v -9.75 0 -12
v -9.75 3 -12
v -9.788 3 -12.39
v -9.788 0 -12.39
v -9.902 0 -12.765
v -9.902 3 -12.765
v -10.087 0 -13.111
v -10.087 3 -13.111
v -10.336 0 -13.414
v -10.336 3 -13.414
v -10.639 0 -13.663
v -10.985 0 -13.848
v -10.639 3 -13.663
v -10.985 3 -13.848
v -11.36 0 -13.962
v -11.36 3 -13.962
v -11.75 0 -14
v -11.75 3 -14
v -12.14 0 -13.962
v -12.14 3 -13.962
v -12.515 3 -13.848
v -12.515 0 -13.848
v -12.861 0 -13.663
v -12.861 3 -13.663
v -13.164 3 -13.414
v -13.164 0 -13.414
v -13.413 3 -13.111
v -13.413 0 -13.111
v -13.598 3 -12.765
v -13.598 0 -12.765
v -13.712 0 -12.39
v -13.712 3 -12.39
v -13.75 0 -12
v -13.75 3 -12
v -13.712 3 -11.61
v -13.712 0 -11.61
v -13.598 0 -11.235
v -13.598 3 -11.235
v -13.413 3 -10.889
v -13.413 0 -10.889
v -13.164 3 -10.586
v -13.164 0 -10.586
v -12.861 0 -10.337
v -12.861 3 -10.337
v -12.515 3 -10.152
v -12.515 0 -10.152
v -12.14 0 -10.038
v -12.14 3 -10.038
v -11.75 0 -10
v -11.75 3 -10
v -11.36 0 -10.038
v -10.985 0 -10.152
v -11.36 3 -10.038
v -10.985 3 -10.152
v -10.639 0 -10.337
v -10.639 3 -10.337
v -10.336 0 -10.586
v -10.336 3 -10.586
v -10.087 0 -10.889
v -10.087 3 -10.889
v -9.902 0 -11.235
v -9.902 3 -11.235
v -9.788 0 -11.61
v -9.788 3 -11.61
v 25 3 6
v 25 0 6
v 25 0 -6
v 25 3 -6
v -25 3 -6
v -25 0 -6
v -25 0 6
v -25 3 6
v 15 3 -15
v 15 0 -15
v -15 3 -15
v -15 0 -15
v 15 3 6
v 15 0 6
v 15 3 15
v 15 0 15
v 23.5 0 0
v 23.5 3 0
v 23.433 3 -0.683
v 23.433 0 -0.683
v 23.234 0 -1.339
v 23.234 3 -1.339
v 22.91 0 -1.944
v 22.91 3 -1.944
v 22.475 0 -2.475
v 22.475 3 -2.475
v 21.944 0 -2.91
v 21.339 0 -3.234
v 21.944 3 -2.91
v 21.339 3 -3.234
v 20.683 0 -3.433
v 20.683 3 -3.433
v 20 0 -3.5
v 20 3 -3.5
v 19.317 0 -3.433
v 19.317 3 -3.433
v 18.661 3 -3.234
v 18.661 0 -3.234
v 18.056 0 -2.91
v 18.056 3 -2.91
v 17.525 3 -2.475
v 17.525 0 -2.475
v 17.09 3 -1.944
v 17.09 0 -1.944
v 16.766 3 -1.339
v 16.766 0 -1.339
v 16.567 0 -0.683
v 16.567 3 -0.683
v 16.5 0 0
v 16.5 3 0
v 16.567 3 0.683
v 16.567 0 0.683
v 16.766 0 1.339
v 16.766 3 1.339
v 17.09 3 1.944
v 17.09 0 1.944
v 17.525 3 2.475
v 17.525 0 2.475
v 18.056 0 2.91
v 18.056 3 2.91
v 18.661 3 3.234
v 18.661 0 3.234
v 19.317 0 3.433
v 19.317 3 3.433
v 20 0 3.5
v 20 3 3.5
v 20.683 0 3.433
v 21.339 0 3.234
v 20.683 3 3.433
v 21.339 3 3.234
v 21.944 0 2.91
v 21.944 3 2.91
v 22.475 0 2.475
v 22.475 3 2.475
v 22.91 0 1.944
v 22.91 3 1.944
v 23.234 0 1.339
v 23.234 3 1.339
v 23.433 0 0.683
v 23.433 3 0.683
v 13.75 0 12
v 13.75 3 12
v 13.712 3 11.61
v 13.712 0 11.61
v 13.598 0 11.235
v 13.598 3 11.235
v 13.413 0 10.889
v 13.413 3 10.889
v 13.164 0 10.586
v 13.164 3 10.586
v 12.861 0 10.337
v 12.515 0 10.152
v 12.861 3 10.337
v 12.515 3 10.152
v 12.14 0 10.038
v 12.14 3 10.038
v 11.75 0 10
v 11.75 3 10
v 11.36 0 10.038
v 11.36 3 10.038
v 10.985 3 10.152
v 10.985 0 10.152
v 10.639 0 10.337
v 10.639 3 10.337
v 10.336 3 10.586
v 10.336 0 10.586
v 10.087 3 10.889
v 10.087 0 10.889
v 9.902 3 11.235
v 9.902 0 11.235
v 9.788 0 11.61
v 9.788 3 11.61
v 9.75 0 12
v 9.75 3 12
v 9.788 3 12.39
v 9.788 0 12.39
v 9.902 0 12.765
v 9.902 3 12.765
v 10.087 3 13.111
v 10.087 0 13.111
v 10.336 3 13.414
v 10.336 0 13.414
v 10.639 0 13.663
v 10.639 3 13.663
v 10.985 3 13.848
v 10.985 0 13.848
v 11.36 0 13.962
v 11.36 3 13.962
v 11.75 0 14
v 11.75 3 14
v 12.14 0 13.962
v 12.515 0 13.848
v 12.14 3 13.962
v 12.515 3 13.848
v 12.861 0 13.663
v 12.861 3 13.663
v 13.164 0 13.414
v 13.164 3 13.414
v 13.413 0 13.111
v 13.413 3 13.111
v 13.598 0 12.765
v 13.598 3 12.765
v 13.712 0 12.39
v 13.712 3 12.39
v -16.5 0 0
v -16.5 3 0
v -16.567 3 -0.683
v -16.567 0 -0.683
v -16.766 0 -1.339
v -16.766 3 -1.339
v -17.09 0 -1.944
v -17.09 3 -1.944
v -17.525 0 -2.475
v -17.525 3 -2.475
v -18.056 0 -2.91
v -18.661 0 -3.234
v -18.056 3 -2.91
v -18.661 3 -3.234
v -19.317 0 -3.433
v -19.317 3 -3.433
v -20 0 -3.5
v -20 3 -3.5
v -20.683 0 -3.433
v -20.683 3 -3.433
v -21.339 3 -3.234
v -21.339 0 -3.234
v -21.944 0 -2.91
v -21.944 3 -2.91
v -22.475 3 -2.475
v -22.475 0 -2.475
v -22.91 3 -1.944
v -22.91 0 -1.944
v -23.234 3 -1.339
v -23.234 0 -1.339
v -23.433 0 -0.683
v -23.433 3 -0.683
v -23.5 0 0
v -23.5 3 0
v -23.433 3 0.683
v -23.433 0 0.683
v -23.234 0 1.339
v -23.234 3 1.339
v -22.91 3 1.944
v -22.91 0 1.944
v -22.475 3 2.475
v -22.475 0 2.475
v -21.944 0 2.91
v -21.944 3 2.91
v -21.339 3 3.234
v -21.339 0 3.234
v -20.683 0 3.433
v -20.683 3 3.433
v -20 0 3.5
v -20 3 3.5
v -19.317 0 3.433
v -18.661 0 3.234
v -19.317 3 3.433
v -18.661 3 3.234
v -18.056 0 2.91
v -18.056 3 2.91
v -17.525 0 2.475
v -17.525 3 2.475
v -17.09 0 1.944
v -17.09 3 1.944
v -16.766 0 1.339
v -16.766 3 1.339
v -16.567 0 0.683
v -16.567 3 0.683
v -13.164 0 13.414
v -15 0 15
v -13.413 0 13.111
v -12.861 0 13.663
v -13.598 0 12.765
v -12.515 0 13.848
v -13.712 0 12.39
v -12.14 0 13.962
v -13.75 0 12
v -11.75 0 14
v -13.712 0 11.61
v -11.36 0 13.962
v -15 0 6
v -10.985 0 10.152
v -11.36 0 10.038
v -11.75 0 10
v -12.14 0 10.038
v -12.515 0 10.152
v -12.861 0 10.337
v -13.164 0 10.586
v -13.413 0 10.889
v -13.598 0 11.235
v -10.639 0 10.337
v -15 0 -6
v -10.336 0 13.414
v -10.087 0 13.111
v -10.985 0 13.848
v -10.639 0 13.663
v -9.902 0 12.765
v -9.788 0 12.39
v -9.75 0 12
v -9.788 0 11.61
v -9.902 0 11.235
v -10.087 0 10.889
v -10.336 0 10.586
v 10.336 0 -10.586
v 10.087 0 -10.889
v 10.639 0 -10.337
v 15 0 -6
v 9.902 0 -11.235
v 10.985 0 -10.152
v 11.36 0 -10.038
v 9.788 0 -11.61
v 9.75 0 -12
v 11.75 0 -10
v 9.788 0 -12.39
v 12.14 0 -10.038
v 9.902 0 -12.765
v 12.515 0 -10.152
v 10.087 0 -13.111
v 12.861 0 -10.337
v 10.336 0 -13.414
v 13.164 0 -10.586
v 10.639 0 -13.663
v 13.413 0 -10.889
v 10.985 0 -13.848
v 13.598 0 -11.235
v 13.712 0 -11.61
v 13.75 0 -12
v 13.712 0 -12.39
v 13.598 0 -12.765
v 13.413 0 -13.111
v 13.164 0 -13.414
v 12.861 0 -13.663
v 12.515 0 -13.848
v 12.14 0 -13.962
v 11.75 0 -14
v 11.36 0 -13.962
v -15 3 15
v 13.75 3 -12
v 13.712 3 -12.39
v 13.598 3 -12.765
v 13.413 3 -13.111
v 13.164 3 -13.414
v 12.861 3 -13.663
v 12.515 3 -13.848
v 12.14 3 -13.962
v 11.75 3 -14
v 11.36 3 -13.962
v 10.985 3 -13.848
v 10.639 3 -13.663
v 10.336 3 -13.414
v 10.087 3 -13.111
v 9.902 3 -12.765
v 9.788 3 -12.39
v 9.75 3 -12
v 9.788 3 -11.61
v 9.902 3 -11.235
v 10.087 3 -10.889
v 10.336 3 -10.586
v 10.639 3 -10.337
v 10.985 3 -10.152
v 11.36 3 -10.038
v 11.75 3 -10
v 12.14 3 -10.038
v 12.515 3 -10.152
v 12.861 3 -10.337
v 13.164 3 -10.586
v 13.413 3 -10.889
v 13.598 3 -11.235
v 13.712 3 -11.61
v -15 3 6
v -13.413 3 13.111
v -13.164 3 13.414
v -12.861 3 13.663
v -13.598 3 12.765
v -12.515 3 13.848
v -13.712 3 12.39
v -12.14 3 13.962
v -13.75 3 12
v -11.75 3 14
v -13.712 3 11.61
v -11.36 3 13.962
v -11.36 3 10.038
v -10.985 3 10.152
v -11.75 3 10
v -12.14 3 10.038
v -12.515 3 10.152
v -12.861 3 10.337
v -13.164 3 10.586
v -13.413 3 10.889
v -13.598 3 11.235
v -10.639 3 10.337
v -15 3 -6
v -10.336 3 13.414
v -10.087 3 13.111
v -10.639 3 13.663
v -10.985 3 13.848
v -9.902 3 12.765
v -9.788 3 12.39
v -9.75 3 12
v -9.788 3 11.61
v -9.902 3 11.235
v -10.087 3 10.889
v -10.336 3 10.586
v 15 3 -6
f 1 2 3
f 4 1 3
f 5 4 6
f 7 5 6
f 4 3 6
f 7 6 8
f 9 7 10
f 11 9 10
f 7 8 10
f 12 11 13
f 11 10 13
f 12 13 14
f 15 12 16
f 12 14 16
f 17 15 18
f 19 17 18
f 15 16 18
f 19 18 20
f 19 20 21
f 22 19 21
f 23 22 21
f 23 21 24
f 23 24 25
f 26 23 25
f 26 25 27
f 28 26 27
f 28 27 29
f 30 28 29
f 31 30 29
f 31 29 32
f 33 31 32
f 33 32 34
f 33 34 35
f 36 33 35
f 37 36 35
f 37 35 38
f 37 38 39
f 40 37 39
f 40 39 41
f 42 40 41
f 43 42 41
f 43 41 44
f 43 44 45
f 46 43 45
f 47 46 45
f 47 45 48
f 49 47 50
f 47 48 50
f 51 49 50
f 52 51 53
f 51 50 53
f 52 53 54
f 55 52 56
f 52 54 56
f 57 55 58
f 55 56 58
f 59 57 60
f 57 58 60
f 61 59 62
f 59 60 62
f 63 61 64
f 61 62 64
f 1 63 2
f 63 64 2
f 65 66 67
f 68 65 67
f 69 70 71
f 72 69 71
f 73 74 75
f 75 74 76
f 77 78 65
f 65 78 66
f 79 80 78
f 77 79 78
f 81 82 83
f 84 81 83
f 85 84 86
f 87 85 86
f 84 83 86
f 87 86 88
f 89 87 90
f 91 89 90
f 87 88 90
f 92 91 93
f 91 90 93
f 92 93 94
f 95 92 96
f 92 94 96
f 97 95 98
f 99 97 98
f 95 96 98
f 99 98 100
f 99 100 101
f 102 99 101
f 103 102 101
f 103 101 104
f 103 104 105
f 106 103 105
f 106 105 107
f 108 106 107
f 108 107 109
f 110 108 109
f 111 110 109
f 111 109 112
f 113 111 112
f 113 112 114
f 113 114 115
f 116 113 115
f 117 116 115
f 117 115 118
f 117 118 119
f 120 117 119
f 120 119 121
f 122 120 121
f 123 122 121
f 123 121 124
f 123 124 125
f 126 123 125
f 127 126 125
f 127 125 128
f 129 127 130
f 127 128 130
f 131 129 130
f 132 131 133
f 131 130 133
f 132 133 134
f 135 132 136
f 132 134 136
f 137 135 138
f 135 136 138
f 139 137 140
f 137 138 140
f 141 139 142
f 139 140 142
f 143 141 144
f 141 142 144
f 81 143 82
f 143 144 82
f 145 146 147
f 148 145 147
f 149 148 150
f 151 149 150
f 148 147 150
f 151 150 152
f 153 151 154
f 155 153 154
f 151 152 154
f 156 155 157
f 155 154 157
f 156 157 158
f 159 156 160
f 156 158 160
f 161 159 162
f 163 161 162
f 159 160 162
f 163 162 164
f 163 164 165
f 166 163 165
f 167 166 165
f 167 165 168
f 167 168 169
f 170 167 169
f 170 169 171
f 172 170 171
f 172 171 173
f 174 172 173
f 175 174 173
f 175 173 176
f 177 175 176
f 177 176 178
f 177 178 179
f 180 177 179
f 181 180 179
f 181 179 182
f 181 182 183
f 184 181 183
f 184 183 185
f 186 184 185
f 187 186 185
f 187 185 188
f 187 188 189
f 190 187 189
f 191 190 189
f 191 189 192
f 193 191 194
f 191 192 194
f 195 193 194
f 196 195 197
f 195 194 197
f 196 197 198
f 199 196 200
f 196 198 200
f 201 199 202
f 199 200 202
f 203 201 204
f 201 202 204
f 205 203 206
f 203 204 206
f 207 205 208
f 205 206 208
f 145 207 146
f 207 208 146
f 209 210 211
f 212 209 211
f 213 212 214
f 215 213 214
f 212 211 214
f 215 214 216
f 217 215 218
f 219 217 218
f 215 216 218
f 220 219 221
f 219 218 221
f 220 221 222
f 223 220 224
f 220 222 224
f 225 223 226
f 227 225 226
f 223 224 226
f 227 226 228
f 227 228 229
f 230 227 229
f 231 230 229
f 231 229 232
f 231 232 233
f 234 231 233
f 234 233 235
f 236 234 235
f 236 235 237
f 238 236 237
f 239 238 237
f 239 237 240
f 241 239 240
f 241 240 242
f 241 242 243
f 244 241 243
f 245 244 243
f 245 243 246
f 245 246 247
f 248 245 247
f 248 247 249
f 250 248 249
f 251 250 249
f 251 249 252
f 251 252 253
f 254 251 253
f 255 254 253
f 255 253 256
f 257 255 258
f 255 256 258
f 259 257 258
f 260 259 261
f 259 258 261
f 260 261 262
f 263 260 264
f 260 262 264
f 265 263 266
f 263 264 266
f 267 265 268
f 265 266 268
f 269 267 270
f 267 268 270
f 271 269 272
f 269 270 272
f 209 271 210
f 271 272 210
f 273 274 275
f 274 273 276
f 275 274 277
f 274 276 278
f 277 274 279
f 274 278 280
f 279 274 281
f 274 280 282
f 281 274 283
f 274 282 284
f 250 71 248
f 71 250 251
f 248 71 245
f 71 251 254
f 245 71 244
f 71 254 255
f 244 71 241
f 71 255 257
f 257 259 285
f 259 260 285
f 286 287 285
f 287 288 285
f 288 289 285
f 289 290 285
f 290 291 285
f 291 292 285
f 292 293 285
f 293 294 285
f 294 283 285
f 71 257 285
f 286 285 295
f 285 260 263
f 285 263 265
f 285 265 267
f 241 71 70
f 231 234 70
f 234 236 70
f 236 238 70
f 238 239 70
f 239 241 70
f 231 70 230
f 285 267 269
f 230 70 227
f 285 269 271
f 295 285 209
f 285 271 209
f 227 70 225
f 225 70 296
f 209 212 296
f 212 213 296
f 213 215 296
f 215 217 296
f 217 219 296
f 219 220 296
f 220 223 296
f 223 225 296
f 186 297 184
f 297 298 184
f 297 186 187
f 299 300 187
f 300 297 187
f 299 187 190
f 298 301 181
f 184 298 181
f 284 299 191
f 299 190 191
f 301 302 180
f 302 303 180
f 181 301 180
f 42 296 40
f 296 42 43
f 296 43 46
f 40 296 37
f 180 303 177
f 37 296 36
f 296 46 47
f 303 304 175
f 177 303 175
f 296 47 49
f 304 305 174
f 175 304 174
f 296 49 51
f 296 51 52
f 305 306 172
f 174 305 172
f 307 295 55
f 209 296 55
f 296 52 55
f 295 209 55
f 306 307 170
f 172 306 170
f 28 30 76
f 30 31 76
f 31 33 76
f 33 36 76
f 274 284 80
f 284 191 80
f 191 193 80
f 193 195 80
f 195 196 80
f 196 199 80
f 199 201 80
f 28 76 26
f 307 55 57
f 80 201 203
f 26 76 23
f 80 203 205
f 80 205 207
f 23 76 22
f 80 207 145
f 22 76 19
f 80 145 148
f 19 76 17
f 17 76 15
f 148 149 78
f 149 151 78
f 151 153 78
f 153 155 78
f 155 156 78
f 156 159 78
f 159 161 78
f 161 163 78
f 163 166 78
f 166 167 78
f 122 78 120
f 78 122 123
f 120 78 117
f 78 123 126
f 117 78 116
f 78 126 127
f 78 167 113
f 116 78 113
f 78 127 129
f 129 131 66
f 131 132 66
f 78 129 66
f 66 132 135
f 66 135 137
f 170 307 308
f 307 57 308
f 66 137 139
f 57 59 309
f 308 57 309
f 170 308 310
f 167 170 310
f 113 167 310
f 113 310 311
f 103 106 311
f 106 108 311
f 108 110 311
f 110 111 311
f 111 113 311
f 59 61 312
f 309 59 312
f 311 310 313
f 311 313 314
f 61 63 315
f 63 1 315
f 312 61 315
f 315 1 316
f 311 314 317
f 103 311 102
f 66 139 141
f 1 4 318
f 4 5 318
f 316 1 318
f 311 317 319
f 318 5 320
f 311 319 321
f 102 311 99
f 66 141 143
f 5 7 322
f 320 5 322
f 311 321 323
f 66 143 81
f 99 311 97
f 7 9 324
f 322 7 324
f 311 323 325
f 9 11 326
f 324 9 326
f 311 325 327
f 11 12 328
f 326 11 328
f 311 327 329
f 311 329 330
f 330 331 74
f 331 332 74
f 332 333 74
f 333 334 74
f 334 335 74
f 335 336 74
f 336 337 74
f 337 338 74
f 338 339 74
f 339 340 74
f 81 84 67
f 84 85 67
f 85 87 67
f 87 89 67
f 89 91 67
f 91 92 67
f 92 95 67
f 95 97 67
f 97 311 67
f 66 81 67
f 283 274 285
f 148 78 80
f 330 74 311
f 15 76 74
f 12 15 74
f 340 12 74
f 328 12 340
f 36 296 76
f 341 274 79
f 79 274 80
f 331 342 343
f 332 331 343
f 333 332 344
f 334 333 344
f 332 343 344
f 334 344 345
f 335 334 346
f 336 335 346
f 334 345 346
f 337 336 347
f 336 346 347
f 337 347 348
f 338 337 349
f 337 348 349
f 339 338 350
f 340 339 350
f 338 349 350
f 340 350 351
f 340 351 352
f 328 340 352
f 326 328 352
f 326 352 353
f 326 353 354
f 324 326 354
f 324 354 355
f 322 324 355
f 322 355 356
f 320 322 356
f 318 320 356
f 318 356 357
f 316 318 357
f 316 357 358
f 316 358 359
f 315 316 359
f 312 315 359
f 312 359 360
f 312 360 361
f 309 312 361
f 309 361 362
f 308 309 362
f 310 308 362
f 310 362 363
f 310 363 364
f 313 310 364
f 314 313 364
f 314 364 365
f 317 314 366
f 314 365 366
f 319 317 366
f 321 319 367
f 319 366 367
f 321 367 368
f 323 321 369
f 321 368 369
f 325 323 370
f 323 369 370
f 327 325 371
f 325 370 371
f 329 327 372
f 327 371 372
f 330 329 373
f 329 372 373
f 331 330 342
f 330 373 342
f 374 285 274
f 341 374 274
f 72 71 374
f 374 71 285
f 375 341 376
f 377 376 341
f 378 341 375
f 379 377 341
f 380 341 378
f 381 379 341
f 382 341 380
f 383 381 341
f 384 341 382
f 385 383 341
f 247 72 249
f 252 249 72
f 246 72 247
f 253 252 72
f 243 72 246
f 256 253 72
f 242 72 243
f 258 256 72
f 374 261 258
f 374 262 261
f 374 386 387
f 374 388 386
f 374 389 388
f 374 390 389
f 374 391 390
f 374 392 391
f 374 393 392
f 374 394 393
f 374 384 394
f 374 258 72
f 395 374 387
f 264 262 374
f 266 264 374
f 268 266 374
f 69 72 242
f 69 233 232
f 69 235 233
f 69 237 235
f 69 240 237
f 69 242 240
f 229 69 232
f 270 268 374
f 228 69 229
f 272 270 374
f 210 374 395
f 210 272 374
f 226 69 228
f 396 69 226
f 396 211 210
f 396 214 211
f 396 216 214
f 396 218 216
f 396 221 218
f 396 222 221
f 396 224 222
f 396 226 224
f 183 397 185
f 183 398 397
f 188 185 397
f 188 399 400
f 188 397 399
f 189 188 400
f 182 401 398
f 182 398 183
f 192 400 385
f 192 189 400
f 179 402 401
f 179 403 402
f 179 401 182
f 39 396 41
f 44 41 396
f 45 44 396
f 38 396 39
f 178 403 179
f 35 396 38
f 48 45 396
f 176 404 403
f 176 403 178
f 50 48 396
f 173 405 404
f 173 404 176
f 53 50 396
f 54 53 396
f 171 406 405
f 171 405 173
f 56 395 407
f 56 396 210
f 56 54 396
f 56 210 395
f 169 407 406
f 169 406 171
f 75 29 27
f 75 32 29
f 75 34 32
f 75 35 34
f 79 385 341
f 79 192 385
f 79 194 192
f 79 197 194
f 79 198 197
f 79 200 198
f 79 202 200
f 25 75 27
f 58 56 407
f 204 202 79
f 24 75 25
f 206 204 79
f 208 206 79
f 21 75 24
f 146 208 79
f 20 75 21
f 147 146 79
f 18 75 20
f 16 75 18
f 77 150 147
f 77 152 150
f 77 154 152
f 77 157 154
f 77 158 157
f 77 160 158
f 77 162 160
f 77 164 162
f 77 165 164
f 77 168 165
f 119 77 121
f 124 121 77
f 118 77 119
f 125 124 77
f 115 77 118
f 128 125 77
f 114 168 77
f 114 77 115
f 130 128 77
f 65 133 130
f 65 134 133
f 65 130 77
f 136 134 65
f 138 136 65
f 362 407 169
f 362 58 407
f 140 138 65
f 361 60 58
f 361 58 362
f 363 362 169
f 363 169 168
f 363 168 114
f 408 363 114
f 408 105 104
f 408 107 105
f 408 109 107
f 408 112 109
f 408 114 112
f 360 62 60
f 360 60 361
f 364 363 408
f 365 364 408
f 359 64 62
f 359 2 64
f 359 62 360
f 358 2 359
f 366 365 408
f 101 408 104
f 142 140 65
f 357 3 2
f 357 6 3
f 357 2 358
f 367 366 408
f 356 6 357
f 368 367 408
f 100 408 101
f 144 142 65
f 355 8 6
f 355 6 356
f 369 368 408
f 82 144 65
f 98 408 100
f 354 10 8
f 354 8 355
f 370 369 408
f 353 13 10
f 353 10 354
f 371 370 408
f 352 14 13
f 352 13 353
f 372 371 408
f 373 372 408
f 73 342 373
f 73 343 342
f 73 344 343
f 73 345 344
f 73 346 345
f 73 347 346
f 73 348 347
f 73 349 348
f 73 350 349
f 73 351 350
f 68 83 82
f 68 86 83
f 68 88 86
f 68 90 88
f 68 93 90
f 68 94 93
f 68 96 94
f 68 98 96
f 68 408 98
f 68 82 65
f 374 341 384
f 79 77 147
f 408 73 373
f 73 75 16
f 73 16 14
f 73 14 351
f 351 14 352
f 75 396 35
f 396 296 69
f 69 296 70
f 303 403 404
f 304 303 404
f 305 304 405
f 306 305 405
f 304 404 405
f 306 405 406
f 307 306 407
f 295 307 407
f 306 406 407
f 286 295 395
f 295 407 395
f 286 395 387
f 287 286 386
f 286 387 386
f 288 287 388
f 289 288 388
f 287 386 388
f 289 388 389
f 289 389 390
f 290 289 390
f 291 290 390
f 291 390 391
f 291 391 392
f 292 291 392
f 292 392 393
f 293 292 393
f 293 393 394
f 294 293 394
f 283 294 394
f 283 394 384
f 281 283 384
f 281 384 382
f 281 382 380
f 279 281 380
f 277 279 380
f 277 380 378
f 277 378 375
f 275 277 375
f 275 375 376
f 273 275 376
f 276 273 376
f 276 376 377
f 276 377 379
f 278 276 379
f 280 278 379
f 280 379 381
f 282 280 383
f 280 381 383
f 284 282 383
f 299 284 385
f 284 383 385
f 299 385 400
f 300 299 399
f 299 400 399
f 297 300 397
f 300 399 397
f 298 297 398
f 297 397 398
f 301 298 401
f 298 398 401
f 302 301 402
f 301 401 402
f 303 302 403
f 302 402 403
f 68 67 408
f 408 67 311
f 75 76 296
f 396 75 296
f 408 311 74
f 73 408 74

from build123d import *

# Parameters (mm, degrees)
BOSS_EXTRUDE1_DEPTH = 3
SKETCH2_R           = 3.5
SKETCH2_R_2         = 2
CUT_EXTRUDE1_DEPTH  = 4


with BuildPart() as part:
    # Sketch1 → Boss-Extrude1 (new body)
    with BuildSketch(Plane(origin=(0, 0, 0), x_dir=(1, 0, 0), z_dir=(0, 1, 0))):
        Polygon((-15, -6), (-15, -15), (15, -15), (15, -6), (25, -6), (25, 6), (15, 6), (15, 15), (-15, 15), (-15, 6), (-25, 6), (-25, -6), align=None)
    extrude(amount=BOSS_EXTRUDE1_DEPTH)

    # Sketch2 → Cut-Extrude1 (cut, through all)
    with BuildSketch(Plane(origin=(0, 3, 0), x_dir=(1, 0, 0), z_dir=(0, 1, 0))):
        with Locations((-20, 0)):
            Circle(SKETCH2_R)
        with Locations((-11.75, 12)):
            Circle(SKETCH2_R_2)
        with Locations((-11.75, -12)):
            Circle(SKETCH2_R_2)
        with Locations((11.75, -12)):
            Circle(SKETCH2_R_2)
        with Locations((20, 0)):
            Circle(SKETCH2_R)
        with Locations((11.75, 12)):
            Circle(SKETCH2_R_2)
    extrude(amount=-CUT_EXTRUDE1_DEPTH, mode=Mode.SUBTRACT)


solid = part.part
